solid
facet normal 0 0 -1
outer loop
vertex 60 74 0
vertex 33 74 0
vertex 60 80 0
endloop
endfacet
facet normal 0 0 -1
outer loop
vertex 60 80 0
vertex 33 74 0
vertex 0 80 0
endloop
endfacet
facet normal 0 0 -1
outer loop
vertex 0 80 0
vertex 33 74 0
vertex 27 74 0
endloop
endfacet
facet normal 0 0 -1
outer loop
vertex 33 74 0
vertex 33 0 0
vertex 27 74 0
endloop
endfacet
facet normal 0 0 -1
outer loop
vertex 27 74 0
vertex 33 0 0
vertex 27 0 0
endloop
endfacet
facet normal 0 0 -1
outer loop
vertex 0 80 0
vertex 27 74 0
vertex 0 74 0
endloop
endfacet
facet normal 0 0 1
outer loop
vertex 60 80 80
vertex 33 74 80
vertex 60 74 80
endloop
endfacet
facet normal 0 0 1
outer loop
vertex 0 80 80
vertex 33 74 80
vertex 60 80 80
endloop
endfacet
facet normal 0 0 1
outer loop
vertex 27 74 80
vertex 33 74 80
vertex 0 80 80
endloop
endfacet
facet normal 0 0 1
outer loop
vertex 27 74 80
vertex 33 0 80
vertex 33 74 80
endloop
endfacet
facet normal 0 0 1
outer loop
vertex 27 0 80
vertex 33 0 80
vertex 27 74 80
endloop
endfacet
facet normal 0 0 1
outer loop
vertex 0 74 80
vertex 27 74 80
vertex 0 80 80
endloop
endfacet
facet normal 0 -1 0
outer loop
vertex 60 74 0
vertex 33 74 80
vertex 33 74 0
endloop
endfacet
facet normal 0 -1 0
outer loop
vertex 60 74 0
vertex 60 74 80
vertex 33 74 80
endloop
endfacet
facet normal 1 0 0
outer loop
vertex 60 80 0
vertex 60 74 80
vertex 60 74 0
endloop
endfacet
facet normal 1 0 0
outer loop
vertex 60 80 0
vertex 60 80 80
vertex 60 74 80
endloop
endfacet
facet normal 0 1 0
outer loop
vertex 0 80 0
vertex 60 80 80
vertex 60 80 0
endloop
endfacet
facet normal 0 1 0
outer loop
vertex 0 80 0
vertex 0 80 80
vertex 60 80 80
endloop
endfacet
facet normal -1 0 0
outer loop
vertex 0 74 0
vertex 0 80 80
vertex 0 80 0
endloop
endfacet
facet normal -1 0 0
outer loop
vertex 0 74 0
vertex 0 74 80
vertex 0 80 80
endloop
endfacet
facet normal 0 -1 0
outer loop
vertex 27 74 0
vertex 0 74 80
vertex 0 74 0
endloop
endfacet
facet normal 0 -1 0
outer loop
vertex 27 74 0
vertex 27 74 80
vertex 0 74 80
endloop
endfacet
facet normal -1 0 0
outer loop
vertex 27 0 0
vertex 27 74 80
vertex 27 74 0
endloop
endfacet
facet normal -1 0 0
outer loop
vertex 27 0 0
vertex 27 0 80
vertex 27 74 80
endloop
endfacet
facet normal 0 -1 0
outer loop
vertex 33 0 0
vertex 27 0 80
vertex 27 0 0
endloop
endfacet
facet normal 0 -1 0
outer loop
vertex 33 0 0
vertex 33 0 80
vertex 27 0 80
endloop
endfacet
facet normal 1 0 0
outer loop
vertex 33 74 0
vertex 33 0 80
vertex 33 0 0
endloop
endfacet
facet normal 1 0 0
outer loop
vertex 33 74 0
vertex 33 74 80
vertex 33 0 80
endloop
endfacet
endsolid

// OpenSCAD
$fn = 32;

// ----------------------------------------------------------------------
// Structural section: tee 60 x 80 mm
// ----------------------------------------------------------------------

// --- parameters (mm) ---
sec_w = 60;               // tee width, X
sec_h = 80;               // tee height, Y
flange_t = 6;             // top flange thickness
web_t = 6;                // web thickness
plate_t = 80;             // cut length, Z (extrusion height)

profile = [[27, 0], [33, 0], [33, 74], [60, 74], [60, 80], [0, 80], [0, 74], [27, 74]];  // primary outline, 8 points, counter clockwise

// --- the one profile operation ---
linear_extrude(height = plate_t) polygon(points = profile);
